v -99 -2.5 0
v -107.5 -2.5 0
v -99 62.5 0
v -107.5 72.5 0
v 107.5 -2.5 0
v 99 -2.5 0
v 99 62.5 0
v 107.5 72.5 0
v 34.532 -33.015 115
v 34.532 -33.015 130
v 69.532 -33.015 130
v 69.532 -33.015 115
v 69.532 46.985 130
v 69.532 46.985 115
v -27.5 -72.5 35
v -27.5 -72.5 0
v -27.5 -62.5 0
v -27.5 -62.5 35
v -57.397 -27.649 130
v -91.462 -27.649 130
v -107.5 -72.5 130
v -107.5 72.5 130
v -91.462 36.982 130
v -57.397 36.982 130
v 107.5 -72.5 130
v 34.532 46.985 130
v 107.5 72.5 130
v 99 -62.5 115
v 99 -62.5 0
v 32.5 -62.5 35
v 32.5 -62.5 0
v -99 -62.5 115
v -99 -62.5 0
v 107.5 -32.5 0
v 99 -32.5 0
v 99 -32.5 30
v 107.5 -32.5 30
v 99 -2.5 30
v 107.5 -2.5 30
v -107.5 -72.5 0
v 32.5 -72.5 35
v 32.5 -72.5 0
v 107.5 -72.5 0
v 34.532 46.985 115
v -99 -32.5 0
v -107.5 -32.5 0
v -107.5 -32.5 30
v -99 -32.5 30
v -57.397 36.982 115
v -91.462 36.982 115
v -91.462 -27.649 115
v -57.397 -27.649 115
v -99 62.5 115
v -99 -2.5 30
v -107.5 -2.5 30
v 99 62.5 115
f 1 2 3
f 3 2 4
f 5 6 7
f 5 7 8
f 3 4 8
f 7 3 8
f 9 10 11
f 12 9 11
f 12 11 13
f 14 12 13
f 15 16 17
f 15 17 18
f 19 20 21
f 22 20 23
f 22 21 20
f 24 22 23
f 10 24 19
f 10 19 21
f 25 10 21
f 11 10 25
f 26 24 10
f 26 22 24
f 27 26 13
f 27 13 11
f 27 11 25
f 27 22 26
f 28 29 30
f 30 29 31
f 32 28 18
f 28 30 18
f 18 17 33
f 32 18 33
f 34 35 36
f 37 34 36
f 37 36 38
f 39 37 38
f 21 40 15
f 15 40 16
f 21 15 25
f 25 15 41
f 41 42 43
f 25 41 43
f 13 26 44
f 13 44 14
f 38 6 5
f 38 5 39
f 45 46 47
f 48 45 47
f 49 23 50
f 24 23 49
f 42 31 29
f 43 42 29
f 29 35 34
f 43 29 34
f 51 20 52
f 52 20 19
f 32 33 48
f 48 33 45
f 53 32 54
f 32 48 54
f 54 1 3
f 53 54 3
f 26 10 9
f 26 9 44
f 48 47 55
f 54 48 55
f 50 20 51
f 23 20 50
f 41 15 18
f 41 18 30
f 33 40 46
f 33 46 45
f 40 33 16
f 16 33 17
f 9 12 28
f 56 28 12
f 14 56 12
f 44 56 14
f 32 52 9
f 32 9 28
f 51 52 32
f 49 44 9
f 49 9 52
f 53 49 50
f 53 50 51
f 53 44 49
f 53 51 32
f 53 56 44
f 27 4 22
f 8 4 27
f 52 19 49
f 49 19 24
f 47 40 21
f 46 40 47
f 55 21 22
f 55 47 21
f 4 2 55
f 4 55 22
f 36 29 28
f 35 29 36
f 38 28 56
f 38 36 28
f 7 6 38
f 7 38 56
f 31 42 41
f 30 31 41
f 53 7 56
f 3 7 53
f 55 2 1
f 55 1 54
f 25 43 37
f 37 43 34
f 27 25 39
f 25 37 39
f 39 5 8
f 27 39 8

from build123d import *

# Parameters (mm, degrees)
SKETCH1_W           = 215
SKETCH1_H           = 145
BOSS_EXTRUDE1_DEPTH = 130
SKETCH3_W           = 30
SKETCH3_H           = 30
CUT_EXTRUDE1_DEPTH  = 262.498087947
SKETCH4_W           = 198
SKETCH4_H           = 125
CUT_EXTRUDE2_DEPTH  = 115
SKETCH5_W           = 34.065007978
SKETCH5_H           = 64.63018637
CUT_EXTRUDE3_DEPTH  = 115
SKETCH6_W           = 35
SKETCH6_H           = 80
CUT_EXTRUDE4_DEPTH  = 115
SKETCH7_W           = 60
SKETCH7_H           = 35
CUT_EXTRUDE5_DEPTH  = 115


with BuildPart() as part:
    # Sketch1 → Boss-Extrude1 (new body)
    with BuildSketch(Plane.XY):
        Rectangle(SKETCH1_W, SKETCH1_H)
    extrude(amount=BOSS_EXTRUDE1_DEPTH)

    # Sketch3 → Cut-Extrude1 (cut, through all)
    with BuildSketch(Plane.ZY.offset(107.5)):
        with Locations((15, -17.5)):
            Rectangle(SKETCH3_W, SKETCH3_H)
    extrude(amount=-CUT_EXTRUDE1_DEPTH, mode=Mode.SUBTRACT)

    # Sketch4 → Cut-Extrude2 (cut)
    with BuildSketch(Plane(origin=(0, 0, 0), x_dir=(-1, 0, 0), z_dir=(0, 0, -1))):
        Rectangle(SKETCH4_W, SKETCH4_H)
    extrude(amount=-CUT_EXTRUDE2_DEPTH, mode=Mode.SUBTRACT)

    # Sketch5 → Cut-Extrude3 (cut)
    with BuildSketch(Plane.XY.offset(130)):
        with Locations((-74.429709212, 4.666439449)):
            Rectangle(SKETCH5_W, SKETCH5_H)
    extrude(amount=-CUT_EXTRUDE3_DEPTH, mode=Mode.SUBTRACT)

    # Sketch6 → Cut-Extrude4 (cut)
    with BuildSketch(Plane.XY.offset(130)):
        with Locations((52.031651923, 6.984940898)):
            Rectangle(SKETCH6_W, SKETCH6_H)
    extrude(amount=-CUT_EXTRUDE4_DEPTH, mode=Mode.SUBTRACT)

    # Sketch7 → Cut-Extrude5 (cut)
    with BuildSketch(Plane.XZ.offset(72.5)):
        with Locations((2.5, 17.5)):
            Rectangle(SKETCH7_W, SKETCH7_H)
    extrude(amount=-CUT_EXTRUDE5_DEPTH, mode=Mode.SUBTRACT)


solid = part.part
